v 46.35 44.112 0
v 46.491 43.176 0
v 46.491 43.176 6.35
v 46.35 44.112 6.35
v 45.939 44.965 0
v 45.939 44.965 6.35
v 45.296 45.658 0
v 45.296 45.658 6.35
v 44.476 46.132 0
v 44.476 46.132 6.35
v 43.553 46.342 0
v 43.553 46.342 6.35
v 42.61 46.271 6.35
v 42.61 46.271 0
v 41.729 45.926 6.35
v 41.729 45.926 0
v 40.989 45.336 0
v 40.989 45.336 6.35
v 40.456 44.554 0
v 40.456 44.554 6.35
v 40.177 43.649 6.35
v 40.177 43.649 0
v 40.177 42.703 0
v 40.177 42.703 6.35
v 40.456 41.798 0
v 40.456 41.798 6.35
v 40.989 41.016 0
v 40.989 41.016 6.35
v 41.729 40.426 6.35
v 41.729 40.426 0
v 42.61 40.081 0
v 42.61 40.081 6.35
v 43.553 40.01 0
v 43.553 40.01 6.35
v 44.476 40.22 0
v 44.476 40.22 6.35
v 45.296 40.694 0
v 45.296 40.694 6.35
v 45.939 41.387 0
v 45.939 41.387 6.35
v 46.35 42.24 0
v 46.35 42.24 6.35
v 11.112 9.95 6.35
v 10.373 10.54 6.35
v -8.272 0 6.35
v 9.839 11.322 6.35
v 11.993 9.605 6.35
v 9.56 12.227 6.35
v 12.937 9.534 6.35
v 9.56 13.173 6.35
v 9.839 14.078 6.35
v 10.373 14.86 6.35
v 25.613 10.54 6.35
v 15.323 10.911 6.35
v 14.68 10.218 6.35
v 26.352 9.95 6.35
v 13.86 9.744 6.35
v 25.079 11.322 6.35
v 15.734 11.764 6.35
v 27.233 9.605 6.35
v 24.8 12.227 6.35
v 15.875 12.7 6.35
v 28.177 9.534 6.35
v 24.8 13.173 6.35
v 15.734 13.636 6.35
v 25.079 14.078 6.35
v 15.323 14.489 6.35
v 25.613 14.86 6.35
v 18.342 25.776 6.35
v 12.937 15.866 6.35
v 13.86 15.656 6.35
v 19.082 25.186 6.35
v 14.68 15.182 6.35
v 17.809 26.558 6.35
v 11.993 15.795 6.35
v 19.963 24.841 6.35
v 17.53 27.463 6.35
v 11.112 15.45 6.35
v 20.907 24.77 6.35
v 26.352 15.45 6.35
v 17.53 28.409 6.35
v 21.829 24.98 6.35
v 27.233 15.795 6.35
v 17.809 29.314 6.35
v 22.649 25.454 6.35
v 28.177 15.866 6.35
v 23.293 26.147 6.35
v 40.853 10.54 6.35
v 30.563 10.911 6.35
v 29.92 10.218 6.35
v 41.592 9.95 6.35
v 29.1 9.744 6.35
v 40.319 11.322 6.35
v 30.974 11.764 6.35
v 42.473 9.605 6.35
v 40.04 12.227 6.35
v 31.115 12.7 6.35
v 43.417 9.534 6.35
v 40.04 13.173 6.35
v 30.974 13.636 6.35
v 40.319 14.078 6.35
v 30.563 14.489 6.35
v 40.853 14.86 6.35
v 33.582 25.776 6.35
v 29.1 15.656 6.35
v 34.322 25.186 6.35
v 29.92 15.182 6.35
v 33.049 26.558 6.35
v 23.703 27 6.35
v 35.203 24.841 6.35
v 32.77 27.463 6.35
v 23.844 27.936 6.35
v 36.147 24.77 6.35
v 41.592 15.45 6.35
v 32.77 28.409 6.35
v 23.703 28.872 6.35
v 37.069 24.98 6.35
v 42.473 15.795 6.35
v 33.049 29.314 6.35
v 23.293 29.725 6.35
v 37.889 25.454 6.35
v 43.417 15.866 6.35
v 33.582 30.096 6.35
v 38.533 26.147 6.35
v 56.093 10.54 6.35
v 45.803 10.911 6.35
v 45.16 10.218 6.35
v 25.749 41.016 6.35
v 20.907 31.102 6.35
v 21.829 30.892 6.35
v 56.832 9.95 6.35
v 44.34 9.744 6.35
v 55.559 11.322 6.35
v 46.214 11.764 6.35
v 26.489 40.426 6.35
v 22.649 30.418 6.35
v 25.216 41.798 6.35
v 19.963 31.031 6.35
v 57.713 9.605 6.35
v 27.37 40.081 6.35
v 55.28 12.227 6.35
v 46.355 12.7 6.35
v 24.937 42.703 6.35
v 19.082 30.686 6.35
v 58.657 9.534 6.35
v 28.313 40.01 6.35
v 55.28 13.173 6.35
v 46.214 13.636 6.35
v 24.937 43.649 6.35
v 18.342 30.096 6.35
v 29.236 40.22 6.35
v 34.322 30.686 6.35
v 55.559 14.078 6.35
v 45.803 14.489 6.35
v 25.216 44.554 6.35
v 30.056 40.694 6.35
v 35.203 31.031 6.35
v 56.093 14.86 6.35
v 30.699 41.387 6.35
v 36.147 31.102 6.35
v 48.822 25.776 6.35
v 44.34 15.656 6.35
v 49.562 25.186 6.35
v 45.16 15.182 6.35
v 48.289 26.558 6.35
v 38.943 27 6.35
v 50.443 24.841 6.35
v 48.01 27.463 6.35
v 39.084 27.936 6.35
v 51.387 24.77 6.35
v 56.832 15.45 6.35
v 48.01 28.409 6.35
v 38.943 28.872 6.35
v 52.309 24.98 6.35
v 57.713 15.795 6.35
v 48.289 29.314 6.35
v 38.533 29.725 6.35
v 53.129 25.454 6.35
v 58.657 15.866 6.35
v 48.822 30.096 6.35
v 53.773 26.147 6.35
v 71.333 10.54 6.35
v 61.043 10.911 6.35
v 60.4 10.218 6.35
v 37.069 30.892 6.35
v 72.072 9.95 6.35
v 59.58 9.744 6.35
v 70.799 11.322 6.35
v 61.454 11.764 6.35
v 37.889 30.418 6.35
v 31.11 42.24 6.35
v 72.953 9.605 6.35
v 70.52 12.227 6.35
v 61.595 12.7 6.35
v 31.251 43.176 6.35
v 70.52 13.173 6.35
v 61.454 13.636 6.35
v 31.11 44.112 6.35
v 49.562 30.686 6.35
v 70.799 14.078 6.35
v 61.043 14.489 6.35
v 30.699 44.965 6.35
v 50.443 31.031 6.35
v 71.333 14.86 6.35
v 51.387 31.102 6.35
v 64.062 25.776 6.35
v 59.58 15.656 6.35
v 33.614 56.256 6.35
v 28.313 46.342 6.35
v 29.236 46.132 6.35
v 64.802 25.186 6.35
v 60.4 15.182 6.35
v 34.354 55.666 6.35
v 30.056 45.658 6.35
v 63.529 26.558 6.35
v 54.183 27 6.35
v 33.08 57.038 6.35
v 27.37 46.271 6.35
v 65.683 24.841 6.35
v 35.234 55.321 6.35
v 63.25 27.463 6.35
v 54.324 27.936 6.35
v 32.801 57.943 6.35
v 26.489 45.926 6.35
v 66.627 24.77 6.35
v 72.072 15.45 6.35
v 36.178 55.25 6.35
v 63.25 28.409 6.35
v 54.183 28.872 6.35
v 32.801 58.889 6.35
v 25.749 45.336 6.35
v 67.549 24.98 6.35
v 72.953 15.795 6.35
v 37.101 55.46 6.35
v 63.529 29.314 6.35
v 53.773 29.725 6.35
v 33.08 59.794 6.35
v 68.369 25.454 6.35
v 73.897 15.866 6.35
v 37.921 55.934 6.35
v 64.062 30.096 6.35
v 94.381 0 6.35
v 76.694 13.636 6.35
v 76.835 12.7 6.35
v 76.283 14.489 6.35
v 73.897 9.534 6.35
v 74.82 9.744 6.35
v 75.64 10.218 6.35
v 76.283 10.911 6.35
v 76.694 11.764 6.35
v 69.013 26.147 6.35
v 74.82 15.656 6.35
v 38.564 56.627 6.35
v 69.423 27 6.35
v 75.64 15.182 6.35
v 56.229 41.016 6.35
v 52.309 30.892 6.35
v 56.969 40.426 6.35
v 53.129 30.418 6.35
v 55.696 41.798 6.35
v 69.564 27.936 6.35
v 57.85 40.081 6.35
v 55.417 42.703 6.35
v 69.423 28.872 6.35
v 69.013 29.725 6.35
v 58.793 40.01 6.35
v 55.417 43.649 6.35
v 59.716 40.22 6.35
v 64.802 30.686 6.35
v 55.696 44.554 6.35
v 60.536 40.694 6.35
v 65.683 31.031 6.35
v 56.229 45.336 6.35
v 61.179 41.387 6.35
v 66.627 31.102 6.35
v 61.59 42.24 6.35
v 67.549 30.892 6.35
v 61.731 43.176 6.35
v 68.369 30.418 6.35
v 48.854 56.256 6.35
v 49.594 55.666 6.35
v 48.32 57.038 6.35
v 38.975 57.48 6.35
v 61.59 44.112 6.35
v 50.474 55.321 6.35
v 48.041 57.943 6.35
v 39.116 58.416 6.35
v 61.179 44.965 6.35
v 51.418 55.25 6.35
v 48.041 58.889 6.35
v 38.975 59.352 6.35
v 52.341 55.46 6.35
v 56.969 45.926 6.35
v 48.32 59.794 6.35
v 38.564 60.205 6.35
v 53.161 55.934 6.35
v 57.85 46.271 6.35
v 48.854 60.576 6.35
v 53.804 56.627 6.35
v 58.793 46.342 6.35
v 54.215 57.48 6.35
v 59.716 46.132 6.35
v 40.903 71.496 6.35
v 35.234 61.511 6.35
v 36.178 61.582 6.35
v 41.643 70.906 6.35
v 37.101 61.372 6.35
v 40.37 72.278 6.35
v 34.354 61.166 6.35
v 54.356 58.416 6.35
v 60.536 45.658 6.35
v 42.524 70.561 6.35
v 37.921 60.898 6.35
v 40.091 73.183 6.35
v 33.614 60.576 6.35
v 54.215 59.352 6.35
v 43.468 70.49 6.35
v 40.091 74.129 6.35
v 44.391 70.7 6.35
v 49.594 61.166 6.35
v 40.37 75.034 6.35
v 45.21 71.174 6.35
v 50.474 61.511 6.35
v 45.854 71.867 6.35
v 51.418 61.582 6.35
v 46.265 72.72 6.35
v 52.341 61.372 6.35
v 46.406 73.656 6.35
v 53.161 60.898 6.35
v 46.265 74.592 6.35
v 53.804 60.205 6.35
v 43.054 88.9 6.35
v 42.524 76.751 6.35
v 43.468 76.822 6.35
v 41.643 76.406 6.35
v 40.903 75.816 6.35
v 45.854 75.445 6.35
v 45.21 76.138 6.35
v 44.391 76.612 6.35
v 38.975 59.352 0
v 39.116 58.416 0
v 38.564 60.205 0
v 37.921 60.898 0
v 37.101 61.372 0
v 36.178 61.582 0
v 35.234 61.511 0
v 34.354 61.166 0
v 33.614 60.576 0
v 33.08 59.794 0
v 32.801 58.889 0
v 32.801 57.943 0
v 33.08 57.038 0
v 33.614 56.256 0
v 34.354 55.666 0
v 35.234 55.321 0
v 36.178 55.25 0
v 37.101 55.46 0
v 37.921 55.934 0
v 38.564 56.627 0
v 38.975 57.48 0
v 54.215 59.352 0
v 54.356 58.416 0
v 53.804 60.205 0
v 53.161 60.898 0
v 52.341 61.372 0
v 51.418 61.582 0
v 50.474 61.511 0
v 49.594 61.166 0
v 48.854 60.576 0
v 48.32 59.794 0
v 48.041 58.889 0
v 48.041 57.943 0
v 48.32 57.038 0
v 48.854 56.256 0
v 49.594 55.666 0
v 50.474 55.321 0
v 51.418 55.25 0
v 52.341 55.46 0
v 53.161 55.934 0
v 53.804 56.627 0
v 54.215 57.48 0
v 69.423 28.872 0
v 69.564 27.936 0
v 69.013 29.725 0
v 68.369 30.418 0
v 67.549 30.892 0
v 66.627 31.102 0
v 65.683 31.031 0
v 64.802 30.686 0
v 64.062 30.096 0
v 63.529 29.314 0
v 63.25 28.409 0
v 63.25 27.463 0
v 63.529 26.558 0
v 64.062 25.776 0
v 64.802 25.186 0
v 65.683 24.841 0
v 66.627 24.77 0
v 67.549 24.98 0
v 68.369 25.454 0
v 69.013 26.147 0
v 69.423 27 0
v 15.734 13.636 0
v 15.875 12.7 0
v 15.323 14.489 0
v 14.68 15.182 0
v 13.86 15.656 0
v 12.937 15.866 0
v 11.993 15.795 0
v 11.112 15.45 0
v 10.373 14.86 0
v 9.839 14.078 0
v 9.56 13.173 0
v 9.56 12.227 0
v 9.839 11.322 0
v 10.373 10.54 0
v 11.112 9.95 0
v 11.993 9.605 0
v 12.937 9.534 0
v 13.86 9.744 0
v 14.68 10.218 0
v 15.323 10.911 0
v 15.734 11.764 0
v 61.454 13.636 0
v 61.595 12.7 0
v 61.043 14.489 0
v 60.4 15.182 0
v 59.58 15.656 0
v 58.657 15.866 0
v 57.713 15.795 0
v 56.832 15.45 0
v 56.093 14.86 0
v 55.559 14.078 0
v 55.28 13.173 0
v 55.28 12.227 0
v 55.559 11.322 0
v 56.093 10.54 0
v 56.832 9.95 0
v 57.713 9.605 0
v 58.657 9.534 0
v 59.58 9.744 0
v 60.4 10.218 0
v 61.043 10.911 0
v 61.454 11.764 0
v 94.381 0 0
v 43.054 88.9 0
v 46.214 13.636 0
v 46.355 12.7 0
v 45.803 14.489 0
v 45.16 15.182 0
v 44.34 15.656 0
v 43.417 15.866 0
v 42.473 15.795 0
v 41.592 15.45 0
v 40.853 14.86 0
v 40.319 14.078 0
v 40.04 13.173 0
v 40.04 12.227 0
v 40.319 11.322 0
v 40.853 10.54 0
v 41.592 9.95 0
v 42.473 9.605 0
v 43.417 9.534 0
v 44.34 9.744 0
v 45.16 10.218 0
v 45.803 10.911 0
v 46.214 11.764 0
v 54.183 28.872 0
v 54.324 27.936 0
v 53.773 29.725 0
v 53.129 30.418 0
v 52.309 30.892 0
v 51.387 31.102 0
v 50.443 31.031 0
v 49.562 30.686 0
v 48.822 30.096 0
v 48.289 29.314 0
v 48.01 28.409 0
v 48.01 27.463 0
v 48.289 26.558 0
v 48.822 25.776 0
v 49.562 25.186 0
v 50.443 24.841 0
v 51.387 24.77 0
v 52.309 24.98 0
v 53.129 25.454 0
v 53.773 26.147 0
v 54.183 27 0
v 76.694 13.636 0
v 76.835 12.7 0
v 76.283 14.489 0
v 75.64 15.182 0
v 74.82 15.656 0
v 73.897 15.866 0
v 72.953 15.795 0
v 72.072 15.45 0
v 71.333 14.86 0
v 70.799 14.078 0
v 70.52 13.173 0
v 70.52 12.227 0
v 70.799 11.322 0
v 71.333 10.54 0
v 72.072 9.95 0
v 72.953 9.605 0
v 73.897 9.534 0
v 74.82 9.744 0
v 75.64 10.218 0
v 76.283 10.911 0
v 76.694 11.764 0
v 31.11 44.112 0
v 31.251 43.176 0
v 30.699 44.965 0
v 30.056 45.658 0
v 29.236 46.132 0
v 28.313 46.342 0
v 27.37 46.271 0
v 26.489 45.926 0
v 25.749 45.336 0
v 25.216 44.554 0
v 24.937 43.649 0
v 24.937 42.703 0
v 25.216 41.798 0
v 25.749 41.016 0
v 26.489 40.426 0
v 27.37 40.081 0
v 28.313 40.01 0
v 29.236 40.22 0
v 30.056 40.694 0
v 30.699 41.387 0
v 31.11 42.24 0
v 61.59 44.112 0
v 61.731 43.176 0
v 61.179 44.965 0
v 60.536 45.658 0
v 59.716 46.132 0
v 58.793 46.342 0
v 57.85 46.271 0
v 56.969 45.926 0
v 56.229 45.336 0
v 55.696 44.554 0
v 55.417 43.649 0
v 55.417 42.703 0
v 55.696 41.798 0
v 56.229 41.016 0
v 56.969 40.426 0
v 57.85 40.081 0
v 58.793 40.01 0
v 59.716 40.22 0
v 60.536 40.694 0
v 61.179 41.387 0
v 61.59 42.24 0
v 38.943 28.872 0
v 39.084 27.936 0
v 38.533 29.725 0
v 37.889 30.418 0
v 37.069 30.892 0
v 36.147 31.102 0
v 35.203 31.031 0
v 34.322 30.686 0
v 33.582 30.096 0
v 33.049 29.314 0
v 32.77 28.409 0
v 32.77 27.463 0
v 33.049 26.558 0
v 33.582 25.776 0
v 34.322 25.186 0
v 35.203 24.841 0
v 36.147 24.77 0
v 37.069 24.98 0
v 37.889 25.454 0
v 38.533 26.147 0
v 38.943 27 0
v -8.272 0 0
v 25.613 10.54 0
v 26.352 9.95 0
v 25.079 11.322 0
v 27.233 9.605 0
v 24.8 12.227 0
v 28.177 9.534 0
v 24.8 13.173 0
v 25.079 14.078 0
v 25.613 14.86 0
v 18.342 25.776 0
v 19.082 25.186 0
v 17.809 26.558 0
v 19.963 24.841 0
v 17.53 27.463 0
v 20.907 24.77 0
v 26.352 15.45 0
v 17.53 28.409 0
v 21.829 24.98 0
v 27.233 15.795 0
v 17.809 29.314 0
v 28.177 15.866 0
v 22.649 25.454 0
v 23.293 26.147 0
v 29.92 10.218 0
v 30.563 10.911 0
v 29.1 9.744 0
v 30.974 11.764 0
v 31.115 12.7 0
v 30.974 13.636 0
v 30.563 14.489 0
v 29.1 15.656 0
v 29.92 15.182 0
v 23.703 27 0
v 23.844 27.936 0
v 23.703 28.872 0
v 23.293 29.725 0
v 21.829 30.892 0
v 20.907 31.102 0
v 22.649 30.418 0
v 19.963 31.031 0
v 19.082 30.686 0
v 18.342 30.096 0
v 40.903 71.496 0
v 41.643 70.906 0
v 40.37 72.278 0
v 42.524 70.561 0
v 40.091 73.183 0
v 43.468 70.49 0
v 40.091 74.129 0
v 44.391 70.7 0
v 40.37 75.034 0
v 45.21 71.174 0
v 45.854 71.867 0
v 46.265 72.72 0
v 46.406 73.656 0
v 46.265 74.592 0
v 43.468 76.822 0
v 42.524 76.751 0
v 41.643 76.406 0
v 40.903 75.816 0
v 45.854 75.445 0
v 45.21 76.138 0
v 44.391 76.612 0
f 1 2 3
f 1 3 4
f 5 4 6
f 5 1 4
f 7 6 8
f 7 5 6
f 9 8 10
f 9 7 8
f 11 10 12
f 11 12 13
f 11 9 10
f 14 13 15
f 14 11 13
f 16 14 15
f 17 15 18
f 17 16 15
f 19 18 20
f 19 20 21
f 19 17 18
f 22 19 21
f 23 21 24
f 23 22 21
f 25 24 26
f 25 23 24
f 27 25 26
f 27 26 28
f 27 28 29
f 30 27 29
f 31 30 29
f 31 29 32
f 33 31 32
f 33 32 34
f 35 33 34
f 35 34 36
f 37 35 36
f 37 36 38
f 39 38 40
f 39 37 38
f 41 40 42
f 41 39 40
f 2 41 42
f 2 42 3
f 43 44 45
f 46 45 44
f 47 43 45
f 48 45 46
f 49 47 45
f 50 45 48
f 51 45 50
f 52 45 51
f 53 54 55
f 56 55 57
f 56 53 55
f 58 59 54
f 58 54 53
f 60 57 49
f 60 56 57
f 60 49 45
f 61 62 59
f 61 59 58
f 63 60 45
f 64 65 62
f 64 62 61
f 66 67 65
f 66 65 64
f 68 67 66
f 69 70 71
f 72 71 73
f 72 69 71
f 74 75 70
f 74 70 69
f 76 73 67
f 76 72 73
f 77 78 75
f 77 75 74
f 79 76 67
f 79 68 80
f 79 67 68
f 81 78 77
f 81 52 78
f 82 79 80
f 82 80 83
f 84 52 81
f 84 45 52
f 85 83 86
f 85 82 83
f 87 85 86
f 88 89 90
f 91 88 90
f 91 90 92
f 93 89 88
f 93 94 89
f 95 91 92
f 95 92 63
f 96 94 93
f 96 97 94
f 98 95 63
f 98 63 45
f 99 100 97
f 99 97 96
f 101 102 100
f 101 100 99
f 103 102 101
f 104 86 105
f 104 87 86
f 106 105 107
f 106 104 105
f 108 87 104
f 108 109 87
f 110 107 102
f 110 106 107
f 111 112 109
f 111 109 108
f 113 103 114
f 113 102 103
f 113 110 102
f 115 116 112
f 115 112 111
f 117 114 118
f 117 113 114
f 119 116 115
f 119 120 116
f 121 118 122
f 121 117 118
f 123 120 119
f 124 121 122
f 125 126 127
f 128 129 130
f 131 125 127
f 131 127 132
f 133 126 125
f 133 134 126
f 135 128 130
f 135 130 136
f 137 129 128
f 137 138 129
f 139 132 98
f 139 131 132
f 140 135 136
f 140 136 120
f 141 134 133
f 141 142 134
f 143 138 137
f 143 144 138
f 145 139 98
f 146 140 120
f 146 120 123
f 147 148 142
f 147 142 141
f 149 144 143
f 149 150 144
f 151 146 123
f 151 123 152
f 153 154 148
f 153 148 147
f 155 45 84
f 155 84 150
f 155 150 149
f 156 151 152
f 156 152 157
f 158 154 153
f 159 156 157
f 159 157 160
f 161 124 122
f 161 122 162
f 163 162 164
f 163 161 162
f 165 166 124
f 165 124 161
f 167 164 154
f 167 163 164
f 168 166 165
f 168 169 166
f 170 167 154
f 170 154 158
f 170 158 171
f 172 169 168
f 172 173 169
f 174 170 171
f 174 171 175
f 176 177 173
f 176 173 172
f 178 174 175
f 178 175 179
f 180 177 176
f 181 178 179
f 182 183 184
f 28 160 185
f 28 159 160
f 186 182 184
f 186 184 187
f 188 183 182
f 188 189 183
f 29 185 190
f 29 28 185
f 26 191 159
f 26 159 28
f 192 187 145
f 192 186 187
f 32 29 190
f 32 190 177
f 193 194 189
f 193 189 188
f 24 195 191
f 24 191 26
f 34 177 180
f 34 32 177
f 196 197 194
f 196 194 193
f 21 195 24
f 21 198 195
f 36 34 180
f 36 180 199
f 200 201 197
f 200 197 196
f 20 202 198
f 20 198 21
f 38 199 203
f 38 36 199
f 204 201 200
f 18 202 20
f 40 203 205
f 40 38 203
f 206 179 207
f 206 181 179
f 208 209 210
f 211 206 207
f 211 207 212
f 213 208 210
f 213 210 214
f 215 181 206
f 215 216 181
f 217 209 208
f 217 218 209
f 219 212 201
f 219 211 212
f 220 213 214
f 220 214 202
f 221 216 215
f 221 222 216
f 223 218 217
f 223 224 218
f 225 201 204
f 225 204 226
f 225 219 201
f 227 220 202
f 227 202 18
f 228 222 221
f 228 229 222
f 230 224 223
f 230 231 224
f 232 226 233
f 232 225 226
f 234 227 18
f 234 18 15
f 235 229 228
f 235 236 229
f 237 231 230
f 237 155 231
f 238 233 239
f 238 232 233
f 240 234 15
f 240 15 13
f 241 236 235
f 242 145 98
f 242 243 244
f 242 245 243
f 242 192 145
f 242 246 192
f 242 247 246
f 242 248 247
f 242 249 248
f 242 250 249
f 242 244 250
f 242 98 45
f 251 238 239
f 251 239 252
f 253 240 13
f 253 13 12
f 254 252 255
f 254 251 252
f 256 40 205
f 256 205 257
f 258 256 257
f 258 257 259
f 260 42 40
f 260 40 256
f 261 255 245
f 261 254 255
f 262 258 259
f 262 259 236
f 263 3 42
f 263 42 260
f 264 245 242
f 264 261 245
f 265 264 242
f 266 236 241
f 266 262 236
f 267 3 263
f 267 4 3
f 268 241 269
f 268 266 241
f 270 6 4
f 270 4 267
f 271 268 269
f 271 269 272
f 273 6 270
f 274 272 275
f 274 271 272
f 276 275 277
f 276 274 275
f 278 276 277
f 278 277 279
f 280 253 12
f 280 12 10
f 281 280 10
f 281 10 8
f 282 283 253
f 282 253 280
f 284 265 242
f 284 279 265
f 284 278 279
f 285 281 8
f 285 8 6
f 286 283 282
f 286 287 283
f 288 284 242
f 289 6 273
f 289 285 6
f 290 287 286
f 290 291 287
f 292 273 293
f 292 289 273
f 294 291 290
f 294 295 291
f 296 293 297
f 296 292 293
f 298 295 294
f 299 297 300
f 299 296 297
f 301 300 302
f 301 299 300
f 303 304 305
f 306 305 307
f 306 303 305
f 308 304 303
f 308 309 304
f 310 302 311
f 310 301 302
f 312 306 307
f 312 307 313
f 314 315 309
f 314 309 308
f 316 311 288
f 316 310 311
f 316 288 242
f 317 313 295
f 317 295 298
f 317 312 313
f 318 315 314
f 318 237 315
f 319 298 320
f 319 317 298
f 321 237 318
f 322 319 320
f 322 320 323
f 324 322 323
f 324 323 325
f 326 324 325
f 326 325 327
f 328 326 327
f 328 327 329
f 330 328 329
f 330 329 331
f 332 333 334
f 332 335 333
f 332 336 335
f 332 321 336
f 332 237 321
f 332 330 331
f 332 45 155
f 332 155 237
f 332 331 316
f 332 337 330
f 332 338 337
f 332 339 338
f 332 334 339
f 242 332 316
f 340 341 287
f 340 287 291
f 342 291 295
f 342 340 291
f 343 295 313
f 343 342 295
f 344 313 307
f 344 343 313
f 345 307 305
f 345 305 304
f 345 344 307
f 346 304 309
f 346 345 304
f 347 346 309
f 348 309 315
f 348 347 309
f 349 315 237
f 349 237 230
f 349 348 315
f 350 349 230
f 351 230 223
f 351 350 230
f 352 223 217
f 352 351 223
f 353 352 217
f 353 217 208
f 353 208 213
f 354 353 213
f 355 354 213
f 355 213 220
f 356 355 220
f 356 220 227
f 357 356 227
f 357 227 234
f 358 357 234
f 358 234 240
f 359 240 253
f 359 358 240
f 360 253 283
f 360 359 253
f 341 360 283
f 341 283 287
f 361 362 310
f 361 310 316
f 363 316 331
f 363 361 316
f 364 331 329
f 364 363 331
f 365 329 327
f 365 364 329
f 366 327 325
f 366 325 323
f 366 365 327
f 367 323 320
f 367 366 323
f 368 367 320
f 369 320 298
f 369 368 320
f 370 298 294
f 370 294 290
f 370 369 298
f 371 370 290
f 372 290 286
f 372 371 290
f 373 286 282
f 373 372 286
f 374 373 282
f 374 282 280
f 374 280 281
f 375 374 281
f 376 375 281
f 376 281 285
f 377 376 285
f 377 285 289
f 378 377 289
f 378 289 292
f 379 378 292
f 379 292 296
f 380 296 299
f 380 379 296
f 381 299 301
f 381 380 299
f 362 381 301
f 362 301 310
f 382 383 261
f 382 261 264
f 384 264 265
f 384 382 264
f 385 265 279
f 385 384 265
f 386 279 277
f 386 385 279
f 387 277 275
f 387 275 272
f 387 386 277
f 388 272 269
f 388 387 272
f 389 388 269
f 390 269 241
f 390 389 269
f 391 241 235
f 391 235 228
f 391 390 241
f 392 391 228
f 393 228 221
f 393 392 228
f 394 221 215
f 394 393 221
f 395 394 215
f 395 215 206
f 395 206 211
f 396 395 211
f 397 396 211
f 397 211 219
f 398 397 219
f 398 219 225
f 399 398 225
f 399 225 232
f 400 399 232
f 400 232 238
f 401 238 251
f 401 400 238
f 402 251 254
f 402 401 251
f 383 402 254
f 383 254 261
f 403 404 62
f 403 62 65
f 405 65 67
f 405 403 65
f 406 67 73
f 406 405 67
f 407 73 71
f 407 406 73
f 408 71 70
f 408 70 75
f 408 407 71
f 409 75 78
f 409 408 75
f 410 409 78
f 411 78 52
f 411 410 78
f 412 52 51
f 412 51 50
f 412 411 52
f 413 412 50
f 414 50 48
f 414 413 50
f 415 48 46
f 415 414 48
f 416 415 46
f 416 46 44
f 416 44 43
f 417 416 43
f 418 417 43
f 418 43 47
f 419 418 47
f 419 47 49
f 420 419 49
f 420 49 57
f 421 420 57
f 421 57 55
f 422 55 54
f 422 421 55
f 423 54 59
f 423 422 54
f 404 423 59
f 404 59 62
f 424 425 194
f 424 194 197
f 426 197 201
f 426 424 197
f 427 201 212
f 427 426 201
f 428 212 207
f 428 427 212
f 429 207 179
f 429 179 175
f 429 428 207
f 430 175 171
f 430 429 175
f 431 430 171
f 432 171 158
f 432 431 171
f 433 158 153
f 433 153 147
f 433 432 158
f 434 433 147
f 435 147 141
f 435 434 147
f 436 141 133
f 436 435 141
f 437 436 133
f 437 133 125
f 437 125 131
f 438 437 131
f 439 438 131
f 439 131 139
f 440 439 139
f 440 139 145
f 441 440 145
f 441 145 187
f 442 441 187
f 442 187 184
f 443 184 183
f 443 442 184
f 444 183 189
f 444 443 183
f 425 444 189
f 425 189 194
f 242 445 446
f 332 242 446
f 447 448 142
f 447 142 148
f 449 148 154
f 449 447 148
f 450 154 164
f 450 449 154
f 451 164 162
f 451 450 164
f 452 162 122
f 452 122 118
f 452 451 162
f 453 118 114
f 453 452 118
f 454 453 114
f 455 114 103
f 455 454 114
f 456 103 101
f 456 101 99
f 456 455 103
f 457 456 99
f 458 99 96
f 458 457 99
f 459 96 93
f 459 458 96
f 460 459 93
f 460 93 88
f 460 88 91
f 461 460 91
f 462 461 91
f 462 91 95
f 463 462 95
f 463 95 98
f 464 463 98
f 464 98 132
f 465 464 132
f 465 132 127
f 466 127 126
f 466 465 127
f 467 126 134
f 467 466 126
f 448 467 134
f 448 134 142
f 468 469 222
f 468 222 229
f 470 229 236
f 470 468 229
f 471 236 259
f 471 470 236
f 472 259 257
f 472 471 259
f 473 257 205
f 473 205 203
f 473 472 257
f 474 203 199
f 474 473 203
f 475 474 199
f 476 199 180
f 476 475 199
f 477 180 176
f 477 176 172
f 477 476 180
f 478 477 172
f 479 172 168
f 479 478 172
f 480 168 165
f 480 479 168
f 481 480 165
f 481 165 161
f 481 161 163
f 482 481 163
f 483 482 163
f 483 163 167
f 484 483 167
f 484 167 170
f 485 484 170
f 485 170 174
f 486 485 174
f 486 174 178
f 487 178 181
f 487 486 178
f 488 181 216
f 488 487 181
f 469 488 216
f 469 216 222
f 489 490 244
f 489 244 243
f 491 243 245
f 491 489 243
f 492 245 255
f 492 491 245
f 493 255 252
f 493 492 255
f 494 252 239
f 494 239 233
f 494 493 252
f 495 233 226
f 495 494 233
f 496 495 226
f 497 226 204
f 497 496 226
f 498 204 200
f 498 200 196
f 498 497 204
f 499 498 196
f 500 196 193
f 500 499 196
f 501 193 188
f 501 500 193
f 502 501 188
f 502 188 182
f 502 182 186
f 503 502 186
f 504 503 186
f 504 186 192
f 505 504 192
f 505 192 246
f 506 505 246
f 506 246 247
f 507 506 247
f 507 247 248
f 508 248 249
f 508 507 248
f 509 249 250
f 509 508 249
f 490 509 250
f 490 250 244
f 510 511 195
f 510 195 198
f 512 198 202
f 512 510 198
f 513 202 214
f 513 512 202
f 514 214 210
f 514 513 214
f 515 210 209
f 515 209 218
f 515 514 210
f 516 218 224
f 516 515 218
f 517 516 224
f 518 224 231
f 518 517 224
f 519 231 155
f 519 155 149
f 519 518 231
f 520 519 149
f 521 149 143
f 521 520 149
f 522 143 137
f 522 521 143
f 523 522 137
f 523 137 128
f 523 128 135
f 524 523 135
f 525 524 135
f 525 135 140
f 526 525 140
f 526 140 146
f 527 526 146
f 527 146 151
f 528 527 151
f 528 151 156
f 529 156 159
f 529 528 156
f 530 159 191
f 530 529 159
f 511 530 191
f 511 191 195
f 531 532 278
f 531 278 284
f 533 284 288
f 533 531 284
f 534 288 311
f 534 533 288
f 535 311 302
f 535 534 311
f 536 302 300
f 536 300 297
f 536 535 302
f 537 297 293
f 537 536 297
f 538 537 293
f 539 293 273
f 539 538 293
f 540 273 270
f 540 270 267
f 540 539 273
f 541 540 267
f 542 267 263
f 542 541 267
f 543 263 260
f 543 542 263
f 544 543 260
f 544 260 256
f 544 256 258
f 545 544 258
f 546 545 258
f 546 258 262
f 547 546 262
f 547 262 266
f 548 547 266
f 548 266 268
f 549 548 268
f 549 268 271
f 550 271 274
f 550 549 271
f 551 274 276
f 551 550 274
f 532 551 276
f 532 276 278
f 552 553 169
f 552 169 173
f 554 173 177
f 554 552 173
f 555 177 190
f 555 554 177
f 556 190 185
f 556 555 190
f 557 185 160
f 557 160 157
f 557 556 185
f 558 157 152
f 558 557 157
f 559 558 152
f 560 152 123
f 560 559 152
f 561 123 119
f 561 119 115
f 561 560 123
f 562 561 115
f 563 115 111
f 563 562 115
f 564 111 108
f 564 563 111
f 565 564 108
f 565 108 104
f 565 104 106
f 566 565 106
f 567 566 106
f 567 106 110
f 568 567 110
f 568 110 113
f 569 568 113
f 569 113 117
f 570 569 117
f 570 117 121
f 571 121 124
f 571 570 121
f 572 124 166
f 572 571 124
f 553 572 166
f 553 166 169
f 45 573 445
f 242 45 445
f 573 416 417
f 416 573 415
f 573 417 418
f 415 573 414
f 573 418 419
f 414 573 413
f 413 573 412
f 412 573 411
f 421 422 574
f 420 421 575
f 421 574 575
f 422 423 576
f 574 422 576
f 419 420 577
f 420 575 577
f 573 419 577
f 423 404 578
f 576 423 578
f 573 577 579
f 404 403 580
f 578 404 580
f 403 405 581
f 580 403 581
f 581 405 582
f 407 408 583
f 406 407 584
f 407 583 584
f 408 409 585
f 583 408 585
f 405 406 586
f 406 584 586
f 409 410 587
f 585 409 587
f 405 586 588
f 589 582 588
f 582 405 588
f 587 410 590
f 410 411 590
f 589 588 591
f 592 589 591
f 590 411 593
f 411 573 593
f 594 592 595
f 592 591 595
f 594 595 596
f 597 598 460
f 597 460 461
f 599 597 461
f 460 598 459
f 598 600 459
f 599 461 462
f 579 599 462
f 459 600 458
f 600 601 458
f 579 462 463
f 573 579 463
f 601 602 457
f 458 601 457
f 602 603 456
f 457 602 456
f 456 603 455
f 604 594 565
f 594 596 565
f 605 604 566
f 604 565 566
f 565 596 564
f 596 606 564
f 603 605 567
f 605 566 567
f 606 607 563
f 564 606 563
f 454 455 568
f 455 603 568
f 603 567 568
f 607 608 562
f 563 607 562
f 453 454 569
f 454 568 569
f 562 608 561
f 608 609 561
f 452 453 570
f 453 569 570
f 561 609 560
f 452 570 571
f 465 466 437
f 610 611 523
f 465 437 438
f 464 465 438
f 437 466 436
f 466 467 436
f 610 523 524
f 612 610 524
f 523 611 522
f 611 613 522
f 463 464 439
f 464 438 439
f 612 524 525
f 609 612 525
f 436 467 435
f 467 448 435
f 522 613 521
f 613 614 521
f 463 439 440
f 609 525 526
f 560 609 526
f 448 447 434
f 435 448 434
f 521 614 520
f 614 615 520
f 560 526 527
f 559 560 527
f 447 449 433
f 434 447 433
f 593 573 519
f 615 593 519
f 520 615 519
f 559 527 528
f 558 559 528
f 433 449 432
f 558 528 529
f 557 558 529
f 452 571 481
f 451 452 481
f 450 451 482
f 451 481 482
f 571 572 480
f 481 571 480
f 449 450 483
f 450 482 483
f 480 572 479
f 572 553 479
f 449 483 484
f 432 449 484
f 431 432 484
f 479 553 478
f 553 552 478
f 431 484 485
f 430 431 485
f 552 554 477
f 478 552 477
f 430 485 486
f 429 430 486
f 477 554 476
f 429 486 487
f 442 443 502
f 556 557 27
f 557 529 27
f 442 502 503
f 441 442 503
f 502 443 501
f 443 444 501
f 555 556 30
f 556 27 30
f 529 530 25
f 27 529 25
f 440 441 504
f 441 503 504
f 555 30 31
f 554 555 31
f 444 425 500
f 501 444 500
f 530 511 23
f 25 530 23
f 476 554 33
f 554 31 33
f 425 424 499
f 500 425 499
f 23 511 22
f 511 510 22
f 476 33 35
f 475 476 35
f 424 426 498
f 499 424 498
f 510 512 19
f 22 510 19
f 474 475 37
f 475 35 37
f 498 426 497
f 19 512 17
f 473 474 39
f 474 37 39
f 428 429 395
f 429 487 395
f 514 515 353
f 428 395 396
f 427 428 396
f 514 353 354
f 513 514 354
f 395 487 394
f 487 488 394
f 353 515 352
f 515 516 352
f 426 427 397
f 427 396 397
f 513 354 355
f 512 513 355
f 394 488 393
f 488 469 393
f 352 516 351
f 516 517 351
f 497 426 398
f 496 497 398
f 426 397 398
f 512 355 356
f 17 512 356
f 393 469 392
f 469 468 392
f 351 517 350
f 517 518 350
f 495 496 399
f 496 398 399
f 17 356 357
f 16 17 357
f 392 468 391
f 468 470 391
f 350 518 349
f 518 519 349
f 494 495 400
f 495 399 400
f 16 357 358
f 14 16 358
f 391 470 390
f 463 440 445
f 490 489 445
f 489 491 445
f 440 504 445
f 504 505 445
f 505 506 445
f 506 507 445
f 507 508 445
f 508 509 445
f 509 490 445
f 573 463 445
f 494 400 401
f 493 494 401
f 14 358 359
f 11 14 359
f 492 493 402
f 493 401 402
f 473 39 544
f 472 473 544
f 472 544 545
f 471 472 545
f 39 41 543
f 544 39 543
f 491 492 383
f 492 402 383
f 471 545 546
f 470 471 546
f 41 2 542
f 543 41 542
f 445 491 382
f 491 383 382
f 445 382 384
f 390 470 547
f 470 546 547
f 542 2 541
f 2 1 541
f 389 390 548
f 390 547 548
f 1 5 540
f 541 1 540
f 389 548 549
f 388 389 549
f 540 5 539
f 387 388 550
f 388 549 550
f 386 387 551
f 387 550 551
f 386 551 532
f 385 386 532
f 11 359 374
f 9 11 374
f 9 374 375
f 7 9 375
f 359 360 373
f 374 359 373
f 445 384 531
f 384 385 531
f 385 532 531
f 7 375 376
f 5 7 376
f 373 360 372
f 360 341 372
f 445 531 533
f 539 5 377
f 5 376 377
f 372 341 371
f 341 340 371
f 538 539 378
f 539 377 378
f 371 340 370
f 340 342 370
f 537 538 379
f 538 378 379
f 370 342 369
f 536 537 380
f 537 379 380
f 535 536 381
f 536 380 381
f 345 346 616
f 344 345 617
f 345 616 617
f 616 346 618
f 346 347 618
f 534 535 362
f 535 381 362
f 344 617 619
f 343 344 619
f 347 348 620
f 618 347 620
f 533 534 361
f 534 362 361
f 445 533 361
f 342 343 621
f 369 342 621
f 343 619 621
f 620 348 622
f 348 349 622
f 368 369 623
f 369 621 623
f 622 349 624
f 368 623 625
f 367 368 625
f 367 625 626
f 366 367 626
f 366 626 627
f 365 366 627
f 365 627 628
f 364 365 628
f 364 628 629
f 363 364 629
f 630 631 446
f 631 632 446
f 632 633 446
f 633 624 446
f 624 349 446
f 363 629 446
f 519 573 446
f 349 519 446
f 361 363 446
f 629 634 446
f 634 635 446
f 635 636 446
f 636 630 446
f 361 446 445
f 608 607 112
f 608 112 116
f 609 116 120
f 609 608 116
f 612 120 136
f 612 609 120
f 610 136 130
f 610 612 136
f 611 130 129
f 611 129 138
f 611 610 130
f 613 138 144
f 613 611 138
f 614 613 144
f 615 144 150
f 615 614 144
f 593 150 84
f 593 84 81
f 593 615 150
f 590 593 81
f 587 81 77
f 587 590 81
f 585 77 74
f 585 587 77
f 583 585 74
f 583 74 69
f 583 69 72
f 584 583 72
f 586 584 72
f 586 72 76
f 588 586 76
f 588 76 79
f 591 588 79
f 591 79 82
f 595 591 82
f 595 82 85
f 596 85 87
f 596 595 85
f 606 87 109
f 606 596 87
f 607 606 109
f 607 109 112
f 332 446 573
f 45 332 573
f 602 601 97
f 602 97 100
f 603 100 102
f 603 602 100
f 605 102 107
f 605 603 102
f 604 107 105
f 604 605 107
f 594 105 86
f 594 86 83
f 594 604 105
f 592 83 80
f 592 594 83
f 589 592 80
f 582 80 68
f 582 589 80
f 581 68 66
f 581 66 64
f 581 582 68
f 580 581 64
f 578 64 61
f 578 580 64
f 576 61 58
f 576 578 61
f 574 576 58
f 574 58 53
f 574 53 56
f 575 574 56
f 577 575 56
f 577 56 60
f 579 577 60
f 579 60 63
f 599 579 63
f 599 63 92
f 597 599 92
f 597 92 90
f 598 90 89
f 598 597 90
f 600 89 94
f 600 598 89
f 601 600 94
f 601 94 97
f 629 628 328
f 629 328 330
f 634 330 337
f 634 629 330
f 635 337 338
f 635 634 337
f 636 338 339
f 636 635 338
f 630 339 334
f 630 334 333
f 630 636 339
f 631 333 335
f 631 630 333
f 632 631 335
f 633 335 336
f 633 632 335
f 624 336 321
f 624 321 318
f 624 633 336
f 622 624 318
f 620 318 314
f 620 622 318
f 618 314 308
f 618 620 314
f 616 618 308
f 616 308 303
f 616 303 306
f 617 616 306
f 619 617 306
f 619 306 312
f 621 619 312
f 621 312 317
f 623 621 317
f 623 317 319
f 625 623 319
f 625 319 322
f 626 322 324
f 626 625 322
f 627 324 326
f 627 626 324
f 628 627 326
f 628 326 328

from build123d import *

# Parameters (mm, degrees)
F7_DEPTH = 6.35
F5_R     = 3.175
F1_R     = 3.175
F2_R     = 3.175
F3_R     = 3.175
F4_R     = 3.175
F8_DEPTH = 6.35


with BuildPart() as f7:
    # F6 (on face) → F7 (new body)
    with BuildSketch(Plane.XY):
        Polygon((-8.272192, 0), (94.380685, 0), (43.054246, 88.9), align=None)
    extrude(amount=F7_DEPTH)

    # F5 (on face) + F1 (on face) + F2 (on face) + F3 (on face) + F4 (on face) → F8 (cut, through all)
    with BuildSketch(Plane.XY):
        with Locations((43.2308, 73.655994)):
            Circle(F5_R)
    with BuildSketch(Plane.XY):
        with Locations((12.7, 12.7)):
            Circle(F1_R)
        with Locations((27.94, 12.7)):
            Circle(F1_R)
        with Locations((43.18, 12.7)):
            Circle(F1_R)
        with Locations((58.42, 12.7)):
            Circle(F1_R)
        with Locations((73.66, 12.7)):
            Circle(F1_R)
    with BuildSketch(Plane.XY):
        with Locations((20.669391, 27.935994)):
            Circle(F2_R)
        with Locations((35.909391, 27.935994)):
            Circle(F2_R)
        with Locations((51.149391, 27.935994)):
            Circle(F2_R)
        with Locations((66.389391, 27.935994)):
            Circle(F2_R)
    with BuildSketch(Plane.XY):
        with Locations((28.076159, 43.175994)):
            Circle(F3_R)
        with Locations((43.316159, 43.175994)):
            Circle(F3_R)
        with Locations((58.556159, 43.175994)):
            Circle(F3_R)
    with BuildSketch(Plane.XY):
        with Locations((35.941, 58.415994)):
            Circle(F4_R)
        with Locations((51.181, 58.415994)):
            Circle(F4_R)
    extrude(amount=F8_DEPTH, mode=Mode.SUBTRACT)


solid = f7.part
